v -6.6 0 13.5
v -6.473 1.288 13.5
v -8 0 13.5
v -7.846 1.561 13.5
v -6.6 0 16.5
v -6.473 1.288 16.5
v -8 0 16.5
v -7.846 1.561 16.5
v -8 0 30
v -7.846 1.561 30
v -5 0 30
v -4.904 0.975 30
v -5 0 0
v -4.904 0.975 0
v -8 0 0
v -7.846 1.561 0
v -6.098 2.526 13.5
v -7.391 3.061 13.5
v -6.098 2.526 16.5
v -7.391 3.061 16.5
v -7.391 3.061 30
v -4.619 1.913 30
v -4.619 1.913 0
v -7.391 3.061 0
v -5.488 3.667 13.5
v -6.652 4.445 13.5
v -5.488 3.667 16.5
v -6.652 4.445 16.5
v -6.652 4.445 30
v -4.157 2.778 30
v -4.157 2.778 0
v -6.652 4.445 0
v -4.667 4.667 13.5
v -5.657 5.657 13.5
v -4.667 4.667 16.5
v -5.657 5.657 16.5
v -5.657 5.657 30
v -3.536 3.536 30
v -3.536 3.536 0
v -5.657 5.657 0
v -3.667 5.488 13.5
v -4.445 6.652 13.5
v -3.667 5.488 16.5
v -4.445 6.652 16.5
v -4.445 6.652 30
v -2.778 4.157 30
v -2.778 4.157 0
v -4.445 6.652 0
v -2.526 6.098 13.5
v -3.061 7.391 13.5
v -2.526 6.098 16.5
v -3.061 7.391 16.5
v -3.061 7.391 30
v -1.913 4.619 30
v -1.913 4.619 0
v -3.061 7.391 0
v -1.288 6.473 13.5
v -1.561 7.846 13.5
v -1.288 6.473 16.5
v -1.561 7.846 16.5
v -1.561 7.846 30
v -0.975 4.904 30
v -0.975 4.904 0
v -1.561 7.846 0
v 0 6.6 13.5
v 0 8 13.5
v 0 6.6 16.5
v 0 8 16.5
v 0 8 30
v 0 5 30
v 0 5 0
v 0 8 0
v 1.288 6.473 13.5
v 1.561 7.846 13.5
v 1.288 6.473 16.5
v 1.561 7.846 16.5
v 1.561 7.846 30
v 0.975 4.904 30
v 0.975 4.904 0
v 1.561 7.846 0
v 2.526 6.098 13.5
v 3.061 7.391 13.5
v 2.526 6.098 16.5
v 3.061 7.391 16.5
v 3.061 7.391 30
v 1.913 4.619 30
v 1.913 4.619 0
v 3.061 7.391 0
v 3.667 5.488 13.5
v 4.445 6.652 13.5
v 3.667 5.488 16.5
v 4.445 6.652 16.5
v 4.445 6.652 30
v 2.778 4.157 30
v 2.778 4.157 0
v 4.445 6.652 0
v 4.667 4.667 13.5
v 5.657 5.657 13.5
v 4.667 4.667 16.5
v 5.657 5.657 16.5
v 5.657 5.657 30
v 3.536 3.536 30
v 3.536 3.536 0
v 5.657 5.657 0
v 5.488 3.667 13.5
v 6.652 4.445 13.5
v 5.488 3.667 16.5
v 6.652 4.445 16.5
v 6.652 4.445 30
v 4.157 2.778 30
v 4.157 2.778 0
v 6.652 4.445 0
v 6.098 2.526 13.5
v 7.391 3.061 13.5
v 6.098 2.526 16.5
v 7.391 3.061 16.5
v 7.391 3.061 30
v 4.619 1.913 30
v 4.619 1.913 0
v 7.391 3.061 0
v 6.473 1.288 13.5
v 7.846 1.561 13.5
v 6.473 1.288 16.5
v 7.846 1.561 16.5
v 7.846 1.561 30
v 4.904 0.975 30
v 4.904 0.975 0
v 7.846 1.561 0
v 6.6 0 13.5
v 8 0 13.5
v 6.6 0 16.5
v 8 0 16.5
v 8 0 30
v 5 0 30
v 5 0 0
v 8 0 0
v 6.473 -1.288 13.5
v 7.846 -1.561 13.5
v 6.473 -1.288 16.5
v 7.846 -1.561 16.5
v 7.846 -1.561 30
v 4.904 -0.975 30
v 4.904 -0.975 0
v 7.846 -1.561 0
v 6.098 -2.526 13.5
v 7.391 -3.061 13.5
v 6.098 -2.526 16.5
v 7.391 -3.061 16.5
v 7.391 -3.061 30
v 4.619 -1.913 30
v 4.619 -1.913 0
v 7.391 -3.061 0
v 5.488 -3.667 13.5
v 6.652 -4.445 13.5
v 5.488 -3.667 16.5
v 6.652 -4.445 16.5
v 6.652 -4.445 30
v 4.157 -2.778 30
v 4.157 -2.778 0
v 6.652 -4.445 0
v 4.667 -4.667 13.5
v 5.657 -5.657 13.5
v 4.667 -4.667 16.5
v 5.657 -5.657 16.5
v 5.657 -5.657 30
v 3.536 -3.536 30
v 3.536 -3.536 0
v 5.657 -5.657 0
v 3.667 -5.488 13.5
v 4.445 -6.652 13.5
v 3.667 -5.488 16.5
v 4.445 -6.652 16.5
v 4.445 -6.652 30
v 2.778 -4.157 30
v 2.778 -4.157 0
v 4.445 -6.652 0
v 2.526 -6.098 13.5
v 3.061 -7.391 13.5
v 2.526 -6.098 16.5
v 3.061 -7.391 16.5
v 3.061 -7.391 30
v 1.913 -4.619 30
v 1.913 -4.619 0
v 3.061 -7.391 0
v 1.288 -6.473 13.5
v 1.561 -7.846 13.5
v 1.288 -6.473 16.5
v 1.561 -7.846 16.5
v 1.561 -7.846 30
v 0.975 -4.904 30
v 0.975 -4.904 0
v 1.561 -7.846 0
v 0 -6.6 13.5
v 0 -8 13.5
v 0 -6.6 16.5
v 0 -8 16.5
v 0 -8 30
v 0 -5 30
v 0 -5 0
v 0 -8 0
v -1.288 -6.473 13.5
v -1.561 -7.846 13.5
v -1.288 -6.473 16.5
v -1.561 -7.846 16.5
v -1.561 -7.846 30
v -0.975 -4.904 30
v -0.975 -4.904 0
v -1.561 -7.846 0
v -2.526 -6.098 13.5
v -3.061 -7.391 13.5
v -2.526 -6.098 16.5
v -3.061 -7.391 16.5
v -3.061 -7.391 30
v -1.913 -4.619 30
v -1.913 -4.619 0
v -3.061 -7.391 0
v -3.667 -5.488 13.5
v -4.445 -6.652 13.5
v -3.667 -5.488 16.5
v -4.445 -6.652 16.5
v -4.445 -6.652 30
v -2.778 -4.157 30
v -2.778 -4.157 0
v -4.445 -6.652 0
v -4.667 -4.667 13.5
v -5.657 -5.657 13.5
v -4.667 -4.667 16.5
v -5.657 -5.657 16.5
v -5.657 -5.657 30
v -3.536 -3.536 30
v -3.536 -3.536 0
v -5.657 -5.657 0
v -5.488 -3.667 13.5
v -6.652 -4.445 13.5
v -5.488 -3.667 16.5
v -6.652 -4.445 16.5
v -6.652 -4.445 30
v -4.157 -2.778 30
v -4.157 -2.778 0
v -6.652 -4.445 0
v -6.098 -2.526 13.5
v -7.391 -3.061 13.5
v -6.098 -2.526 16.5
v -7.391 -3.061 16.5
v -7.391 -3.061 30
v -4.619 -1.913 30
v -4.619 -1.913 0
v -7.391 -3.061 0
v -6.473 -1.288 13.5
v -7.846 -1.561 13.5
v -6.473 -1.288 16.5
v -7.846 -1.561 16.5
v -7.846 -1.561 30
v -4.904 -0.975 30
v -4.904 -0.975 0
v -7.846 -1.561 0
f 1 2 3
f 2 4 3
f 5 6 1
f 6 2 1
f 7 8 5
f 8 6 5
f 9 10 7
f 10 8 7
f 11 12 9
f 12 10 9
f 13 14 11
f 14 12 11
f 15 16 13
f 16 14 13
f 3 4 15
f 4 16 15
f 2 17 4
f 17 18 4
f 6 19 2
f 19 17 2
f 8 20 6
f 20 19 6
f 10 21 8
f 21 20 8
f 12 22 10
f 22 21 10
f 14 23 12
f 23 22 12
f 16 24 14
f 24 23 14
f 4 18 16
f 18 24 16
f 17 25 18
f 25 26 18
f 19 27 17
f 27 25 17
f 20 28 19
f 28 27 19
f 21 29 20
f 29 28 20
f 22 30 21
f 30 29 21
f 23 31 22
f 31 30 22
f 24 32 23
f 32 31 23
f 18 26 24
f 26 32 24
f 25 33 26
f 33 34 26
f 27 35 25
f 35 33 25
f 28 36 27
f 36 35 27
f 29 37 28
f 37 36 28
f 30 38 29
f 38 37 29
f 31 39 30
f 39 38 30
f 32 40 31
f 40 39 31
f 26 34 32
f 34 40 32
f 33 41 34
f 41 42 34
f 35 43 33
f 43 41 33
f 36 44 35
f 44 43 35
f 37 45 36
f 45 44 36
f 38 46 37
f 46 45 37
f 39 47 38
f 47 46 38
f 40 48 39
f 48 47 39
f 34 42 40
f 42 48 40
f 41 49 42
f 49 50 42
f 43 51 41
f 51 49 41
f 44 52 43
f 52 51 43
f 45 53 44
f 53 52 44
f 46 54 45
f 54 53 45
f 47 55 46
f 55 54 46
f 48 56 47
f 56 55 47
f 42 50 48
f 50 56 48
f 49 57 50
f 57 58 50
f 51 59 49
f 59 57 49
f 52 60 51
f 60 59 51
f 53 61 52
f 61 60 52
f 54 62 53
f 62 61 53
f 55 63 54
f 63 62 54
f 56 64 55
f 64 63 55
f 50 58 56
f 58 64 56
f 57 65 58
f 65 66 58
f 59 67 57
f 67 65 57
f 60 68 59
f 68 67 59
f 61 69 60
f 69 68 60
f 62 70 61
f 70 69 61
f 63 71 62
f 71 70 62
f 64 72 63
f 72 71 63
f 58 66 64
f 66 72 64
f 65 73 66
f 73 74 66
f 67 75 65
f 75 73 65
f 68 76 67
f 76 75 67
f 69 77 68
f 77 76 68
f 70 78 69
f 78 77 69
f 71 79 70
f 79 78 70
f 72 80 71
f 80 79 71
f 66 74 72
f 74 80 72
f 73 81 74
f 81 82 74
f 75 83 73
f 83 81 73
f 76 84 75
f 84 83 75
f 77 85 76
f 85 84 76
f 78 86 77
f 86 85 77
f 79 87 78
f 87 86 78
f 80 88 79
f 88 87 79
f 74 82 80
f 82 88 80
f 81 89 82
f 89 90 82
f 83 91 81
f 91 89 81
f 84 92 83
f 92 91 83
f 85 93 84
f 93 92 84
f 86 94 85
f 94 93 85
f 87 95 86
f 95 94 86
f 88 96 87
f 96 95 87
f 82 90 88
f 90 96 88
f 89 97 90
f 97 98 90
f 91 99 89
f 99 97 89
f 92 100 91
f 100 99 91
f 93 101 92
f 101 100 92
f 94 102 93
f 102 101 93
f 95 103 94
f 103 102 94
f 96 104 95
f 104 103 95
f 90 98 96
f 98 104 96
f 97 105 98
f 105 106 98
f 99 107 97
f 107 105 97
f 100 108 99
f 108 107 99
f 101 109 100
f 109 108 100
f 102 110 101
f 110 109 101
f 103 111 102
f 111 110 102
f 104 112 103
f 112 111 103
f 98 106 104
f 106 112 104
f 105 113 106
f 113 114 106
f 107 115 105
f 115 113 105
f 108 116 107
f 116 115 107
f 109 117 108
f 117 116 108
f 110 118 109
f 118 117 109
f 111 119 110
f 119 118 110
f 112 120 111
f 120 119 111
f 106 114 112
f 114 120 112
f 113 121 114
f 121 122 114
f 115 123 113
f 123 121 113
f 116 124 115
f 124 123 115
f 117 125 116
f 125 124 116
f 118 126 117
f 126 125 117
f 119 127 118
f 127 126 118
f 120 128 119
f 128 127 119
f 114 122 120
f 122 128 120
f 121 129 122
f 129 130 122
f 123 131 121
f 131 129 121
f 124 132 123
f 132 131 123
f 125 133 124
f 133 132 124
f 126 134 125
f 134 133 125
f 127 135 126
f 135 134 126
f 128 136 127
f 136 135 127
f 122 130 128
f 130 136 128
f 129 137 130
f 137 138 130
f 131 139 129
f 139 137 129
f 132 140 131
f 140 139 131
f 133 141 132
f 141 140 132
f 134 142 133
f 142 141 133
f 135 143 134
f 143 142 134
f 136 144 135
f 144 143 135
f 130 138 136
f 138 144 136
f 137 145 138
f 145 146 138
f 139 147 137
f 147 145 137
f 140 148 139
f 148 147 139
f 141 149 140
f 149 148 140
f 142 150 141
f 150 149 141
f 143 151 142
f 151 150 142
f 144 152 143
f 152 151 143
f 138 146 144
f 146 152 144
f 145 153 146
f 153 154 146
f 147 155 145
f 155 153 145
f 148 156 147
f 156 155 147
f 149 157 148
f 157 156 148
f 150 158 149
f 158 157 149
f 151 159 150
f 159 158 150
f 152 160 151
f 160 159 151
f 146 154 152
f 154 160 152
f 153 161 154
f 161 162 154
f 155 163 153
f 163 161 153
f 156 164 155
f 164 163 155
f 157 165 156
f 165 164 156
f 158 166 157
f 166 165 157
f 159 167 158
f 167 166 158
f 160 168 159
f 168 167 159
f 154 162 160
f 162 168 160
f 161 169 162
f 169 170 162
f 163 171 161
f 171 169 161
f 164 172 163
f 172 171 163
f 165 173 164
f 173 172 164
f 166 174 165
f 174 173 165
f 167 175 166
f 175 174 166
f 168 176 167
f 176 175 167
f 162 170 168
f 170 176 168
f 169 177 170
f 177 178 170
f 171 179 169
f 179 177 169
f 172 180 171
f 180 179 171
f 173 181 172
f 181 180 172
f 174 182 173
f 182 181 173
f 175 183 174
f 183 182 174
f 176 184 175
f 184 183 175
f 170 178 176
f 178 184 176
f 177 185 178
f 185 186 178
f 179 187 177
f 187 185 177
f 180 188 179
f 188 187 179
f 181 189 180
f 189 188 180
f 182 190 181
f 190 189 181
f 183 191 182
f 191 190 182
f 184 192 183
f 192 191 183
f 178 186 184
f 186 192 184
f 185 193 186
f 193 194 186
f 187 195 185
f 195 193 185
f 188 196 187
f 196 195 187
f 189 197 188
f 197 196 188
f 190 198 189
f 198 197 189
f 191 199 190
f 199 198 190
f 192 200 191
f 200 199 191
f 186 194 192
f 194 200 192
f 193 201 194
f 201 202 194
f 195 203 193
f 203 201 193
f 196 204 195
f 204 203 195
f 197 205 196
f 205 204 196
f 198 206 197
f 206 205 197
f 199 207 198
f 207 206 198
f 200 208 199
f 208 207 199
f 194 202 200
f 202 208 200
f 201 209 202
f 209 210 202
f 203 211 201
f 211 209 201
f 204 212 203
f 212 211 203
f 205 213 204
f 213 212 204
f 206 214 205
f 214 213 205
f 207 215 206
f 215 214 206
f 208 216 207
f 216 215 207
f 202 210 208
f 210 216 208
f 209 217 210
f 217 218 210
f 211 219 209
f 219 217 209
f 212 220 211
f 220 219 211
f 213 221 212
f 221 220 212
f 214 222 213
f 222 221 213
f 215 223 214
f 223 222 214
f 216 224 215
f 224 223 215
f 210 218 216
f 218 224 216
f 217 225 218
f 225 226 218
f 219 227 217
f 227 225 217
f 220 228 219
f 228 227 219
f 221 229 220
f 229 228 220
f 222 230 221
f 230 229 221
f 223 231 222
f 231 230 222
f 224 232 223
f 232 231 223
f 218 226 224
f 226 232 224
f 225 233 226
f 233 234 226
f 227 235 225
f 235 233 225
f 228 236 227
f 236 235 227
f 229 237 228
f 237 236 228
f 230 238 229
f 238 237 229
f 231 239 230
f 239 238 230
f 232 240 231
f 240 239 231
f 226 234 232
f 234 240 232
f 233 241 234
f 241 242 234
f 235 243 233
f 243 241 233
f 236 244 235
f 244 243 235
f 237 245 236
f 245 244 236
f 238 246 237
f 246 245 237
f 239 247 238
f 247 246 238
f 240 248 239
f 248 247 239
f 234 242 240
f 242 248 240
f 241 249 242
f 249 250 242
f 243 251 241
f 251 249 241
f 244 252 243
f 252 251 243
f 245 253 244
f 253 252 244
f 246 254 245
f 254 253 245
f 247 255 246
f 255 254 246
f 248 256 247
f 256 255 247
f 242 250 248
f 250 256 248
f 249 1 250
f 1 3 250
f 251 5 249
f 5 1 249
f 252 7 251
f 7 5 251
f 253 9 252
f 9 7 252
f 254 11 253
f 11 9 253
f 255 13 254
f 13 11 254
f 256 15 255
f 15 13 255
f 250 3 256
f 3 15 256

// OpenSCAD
$fn = 32;

// ----------------------------------------------------------------------
// Grooved revolve: stepped, bore R5
// ----------------------------------------------------------------------

// --- parameters (mm) ---
bore_r = 5;               // bore radius
outer_r = 8;              // outer radius of the body
total_h = 30;             // overall height, Z
wall = 3;                 // radial wall thickness
groove_w = 3;             // groove width
groove_d = 1.4;           // groove depth
grooves = 1;              // number of outer grooves

bbox_x = 2 * outer_r;  // full diameter
bore_d = 2 * bore_r;  // bore diameter
body_d = 2 * outer_r;  // body diameter
revolve_angle = 360;  // full turn around the Z axis

profile = [[5, 0], [8, 0], [8, 13.5], [6.6, 13.5], [6.6, 16.5], [8, 16.5], [8, 30], [5, 30]];  // primary outline, 8 points, counter clockwise

// --- the one profile operation ---
rotate_extrude(angle = revolve_angle) polygon(points = profile);
